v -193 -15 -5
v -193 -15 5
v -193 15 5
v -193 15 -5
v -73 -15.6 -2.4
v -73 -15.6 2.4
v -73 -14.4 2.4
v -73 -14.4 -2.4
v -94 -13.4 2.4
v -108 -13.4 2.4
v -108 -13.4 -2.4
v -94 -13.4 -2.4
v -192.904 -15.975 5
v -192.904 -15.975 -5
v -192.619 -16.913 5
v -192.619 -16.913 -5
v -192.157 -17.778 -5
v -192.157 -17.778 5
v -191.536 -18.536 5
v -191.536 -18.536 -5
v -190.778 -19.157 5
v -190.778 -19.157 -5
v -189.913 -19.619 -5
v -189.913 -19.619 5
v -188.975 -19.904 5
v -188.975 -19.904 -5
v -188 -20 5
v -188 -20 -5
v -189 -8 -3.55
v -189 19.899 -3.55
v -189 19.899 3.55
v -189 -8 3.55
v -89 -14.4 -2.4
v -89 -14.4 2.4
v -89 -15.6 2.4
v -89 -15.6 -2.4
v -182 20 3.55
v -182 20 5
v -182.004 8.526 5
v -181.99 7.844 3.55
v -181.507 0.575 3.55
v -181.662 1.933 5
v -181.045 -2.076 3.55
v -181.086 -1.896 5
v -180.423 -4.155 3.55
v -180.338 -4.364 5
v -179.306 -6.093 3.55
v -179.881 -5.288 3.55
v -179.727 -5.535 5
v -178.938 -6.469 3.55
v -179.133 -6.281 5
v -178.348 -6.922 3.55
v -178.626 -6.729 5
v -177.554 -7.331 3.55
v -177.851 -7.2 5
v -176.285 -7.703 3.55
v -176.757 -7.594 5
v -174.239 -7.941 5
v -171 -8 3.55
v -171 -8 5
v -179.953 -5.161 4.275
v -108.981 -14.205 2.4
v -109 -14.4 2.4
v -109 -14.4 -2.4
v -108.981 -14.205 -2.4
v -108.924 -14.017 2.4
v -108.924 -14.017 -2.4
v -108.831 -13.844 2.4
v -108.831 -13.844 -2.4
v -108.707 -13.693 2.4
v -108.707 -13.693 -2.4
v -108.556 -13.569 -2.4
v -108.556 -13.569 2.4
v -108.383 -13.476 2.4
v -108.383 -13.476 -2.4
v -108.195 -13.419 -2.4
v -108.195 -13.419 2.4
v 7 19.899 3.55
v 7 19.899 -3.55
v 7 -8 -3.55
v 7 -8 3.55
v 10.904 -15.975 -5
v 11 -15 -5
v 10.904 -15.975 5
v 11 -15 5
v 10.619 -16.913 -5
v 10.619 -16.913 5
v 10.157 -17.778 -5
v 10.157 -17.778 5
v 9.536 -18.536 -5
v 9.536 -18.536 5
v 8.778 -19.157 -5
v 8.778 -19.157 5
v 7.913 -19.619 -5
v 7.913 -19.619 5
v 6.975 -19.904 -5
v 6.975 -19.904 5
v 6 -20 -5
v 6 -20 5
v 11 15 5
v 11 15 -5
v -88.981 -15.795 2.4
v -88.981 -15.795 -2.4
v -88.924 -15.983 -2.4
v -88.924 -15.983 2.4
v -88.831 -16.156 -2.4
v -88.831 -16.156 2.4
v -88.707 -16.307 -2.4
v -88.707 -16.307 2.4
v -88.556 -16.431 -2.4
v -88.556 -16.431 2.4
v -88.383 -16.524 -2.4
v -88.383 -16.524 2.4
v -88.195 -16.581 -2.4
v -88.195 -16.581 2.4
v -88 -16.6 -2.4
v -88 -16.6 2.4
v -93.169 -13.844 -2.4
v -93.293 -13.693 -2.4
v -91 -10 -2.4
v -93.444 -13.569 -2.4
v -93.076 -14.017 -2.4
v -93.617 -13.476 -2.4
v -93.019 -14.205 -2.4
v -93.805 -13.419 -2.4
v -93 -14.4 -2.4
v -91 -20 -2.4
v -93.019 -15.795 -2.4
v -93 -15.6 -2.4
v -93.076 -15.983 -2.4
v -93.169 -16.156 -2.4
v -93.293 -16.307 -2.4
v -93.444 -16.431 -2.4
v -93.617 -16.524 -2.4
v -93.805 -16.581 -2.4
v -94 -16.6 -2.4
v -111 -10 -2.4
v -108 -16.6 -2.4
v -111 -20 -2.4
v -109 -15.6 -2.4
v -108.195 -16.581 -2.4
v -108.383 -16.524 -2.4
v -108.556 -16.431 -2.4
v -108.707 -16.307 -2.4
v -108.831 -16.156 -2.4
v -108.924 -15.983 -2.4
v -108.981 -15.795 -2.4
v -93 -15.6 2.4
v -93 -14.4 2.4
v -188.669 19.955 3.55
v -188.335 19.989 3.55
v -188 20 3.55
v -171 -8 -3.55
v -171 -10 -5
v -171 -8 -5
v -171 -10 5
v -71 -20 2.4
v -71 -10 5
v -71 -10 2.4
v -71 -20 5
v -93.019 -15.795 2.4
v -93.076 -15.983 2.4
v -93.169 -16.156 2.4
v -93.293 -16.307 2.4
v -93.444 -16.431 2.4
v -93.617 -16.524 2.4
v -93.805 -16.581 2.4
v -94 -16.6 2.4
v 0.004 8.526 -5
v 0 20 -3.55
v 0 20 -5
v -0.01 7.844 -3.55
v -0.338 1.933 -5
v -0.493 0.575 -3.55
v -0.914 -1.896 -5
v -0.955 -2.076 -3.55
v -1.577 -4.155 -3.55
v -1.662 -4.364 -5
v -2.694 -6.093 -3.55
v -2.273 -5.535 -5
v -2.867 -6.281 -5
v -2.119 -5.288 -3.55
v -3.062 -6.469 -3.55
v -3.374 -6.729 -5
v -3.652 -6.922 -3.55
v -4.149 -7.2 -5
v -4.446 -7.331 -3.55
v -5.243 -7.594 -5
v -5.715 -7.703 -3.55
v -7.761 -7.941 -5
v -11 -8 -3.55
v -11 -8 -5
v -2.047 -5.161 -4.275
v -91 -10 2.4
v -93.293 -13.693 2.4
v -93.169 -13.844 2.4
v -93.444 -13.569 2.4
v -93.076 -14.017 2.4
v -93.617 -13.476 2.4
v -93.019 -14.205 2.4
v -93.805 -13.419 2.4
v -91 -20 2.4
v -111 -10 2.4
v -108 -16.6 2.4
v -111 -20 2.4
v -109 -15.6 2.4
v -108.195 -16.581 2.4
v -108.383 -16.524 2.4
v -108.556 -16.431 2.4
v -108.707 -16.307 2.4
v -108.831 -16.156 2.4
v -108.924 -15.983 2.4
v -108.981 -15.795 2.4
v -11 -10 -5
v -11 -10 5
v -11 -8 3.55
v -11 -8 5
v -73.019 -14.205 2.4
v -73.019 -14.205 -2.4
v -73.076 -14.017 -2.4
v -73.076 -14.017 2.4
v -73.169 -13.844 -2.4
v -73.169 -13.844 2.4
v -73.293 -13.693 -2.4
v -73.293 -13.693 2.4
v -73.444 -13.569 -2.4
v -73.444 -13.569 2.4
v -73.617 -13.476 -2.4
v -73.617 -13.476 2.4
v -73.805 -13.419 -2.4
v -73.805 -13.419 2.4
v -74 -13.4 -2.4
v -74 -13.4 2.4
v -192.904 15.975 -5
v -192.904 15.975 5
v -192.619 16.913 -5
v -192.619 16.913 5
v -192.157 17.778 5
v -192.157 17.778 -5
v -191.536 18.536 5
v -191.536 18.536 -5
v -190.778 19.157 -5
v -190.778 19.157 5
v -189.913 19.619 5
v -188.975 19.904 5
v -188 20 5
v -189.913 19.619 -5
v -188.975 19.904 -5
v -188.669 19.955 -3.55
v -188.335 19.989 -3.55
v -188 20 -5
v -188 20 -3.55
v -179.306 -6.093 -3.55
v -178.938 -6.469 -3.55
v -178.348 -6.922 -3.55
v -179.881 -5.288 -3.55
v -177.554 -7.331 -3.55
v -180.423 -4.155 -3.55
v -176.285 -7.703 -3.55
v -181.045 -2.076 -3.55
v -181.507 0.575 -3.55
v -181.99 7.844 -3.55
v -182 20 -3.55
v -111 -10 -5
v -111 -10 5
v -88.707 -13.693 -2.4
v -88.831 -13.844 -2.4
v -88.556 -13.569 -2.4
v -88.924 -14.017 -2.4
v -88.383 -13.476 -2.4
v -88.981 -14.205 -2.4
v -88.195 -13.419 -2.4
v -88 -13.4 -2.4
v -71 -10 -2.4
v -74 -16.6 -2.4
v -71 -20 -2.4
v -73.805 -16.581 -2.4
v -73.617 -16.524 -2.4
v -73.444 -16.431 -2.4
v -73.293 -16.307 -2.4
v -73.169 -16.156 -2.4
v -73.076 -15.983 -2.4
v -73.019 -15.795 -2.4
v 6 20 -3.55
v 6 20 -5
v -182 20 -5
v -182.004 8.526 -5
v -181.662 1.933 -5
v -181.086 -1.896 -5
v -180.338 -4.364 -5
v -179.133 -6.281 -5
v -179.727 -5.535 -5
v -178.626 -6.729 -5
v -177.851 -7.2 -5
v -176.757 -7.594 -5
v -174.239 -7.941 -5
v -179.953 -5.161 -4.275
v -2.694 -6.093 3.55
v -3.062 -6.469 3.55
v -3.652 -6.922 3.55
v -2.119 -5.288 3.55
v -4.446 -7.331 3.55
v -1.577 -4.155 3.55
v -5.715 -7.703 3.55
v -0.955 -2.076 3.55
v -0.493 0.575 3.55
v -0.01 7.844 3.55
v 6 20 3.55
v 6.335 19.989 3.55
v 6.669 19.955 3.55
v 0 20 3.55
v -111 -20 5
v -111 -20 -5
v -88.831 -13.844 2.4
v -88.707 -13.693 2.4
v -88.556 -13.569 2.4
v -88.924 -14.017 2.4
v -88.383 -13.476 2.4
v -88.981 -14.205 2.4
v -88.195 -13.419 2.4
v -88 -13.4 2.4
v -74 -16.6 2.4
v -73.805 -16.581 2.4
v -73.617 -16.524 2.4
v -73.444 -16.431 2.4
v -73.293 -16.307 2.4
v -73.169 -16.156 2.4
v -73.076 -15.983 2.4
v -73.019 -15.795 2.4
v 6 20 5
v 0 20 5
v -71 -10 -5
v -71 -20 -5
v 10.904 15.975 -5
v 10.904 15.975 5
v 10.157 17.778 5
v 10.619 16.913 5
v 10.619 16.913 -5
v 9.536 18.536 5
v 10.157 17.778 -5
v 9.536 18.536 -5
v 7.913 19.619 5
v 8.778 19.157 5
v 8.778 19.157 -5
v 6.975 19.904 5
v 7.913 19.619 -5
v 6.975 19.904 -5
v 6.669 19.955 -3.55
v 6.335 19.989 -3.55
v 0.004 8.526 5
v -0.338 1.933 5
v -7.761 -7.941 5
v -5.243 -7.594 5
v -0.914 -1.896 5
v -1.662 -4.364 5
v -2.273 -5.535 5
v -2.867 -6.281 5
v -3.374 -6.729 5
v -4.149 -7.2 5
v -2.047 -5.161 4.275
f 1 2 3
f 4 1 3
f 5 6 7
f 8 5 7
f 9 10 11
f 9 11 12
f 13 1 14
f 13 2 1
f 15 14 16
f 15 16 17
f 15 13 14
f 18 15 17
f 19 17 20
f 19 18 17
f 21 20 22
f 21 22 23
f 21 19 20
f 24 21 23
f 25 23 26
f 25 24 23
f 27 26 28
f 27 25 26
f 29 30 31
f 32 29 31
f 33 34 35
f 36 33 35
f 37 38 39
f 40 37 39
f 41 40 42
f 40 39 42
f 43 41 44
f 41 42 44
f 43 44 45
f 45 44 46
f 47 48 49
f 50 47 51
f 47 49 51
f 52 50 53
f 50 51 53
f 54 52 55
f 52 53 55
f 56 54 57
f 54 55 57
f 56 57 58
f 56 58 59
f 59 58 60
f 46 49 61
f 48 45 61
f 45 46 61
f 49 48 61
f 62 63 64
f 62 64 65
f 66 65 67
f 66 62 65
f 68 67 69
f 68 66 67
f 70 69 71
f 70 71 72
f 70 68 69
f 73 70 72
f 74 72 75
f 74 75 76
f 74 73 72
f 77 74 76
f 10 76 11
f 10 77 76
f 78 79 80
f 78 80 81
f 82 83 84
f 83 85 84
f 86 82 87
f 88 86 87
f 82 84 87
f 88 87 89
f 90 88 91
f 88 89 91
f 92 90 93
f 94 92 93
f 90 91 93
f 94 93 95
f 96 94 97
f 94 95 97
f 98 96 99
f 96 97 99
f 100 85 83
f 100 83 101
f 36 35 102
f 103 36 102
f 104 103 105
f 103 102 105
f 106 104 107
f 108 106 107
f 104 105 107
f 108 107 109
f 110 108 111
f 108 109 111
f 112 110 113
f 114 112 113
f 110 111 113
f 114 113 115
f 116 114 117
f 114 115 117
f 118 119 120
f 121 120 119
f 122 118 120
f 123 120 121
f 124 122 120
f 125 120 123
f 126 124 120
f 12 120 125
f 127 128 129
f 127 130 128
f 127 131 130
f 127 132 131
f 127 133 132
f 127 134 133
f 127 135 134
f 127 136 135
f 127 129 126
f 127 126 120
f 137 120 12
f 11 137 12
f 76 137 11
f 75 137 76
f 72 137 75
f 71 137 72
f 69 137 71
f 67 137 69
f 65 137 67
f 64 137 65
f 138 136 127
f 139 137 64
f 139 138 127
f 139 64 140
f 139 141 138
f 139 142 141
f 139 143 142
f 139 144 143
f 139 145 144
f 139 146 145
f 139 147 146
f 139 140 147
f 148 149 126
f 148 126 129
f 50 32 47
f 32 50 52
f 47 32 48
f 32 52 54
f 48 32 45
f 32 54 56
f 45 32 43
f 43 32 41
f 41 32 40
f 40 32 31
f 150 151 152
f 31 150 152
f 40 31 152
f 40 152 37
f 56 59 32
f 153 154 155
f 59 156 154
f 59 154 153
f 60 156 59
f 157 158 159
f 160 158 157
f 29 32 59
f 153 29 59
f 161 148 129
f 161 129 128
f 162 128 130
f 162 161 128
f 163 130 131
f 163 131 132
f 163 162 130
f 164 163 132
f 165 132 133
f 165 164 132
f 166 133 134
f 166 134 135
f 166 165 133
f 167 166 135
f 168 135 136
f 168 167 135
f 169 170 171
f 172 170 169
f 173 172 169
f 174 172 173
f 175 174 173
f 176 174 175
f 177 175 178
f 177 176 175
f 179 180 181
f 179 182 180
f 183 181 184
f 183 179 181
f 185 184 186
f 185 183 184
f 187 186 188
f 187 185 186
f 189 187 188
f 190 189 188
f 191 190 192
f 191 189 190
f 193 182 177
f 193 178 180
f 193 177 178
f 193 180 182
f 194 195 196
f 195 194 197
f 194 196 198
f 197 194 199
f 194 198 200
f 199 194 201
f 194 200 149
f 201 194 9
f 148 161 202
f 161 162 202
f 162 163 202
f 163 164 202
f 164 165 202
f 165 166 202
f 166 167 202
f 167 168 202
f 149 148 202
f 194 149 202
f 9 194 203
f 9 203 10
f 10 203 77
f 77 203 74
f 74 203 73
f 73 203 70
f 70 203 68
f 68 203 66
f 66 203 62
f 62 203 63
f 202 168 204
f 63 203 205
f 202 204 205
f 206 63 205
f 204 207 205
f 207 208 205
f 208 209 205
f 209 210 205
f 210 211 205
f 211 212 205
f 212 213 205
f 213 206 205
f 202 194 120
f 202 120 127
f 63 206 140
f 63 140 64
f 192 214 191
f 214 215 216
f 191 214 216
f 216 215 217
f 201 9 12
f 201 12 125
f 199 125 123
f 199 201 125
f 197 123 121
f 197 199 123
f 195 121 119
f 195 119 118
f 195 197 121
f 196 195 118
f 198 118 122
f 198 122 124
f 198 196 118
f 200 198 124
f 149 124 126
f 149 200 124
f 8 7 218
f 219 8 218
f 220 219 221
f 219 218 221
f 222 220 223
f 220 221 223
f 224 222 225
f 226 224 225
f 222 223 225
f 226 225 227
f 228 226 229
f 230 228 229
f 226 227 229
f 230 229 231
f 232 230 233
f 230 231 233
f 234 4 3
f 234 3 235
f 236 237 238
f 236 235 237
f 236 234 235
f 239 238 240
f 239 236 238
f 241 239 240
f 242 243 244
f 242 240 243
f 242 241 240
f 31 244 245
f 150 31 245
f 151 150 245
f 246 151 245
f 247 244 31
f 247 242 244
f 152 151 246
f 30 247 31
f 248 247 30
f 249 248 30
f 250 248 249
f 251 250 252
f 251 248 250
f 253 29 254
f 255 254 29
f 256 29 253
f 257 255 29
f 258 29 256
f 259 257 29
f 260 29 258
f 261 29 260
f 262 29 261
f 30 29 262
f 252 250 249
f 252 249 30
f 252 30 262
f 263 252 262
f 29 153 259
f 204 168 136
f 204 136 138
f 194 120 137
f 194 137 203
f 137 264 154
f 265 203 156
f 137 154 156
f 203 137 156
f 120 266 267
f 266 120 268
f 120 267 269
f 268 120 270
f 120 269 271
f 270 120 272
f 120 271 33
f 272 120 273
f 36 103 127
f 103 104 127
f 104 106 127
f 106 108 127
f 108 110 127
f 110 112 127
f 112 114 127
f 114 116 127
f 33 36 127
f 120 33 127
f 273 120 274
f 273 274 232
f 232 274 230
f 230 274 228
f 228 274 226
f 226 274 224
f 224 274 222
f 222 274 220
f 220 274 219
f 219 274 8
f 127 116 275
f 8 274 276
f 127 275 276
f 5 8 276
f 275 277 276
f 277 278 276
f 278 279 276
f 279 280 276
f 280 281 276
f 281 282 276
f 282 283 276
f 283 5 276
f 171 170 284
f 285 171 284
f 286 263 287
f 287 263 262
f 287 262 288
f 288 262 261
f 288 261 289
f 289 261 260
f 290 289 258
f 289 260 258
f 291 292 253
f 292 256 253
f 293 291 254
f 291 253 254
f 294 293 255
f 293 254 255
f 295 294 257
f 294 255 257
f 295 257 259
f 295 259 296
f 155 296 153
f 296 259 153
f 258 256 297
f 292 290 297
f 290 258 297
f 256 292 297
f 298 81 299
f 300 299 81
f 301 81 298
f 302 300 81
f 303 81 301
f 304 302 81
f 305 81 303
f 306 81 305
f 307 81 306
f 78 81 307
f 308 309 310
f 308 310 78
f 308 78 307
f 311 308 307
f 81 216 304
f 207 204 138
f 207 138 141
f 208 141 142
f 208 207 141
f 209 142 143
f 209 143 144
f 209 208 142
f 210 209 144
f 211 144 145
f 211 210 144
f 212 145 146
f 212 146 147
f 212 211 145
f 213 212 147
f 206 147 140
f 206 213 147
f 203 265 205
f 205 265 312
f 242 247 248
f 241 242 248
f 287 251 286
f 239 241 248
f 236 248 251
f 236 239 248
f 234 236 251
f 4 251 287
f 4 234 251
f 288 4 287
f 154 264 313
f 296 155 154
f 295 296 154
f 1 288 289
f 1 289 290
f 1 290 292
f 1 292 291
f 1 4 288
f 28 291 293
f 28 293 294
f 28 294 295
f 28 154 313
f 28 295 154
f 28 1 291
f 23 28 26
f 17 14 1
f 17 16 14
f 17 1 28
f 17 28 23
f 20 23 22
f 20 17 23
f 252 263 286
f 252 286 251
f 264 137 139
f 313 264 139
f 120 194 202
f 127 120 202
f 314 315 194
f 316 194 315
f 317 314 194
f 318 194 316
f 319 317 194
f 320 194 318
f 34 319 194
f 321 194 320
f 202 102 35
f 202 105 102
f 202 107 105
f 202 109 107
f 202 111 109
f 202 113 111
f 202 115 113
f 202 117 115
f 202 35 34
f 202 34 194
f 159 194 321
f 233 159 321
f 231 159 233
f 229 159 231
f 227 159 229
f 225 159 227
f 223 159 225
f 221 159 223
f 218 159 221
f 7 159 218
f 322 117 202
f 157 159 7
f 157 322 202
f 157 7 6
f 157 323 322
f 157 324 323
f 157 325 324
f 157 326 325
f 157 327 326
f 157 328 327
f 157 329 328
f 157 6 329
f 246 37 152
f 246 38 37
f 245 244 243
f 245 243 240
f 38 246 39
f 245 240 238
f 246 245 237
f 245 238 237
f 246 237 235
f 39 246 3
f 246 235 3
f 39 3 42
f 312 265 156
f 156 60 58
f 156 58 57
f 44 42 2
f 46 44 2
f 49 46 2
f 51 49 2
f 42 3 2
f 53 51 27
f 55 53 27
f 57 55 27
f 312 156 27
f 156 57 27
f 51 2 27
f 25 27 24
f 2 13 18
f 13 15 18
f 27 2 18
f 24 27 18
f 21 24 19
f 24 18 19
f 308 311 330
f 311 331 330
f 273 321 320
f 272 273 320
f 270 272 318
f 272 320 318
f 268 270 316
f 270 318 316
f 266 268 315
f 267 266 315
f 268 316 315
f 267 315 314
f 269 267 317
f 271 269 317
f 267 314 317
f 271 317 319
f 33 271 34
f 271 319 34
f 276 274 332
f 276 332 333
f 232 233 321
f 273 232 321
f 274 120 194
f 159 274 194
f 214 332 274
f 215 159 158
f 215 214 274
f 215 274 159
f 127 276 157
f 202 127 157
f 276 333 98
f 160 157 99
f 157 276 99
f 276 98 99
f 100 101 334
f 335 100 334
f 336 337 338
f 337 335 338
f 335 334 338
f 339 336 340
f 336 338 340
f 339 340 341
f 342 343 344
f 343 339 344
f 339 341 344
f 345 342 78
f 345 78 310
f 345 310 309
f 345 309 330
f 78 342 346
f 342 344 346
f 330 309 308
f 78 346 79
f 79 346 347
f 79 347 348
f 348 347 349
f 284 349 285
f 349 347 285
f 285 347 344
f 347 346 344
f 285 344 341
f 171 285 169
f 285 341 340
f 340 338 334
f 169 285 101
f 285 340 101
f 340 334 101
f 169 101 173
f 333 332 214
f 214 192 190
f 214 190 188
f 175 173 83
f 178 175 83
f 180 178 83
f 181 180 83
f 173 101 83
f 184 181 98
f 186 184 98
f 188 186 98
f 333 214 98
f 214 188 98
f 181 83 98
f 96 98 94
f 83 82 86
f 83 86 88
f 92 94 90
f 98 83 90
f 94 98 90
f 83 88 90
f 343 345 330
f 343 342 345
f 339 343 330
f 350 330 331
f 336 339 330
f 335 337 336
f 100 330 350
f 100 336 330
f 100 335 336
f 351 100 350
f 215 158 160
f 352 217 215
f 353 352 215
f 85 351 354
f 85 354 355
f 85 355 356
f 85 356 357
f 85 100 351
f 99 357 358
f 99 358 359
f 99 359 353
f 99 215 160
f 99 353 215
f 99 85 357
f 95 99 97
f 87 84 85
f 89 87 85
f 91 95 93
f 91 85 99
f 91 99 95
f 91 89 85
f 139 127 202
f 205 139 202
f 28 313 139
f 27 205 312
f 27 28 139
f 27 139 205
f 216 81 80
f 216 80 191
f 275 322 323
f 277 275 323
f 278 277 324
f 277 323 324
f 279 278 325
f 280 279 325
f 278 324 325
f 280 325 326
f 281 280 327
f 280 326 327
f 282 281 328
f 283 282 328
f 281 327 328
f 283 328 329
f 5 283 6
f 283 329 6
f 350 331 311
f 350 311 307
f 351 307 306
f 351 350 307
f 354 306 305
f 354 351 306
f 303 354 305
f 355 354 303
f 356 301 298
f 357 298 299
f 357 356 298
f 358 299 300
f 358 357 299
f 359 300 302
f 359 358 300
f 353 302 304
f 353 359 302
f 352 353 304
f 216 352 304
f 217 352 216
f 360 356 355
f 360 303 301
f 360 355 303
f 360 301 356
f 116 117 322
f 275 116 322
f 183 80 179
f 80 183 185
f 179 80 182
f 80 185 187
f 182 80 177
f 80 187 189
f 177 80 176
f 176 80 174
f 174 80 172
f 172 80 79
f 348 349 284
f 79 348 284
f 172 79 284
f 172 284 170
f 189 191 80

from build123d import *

# Parameters (mm, degrees)
F0_W         = 22
F0_H         = 40
F1_DEPTH     = 5
F2_W         = 18
F2_H         = 7.1
F3_DEPTH     = 28
F4_W         = 10
F4_H         = 10
F5_DEPTH     = 60
F6_W         = 10
F6_H         = 4.8
F7_DEPTH     = 20
F9_DEPTH     = 4.8
F11_DEPTH    = 10
F12_R        = 5
F13_T1_DEPTH = 35


# Not quite as in the source:
# - a fillet or chamfer that OpenCascade refuses, or shapes differently, is made with other operations: its cross-section is extruded or revolved along the edge and cut away or added


with BuildPart() as f1:
    # F0 (on Top) → F1 (new body, symmetric)
    with BuildSketch(Plane.XY):
        Rectangle(F0_W, F0_H)
    extrude(amount=F1_DEPTH, both=True)

    # F2 (on face) → F3 (cut)
    with BuildSketch(Plane(origin=(0, 20, 0), x_dir=(-1, 0, 0), z_dir=(0, 1, 0))):
        with Locations((2, 0)):
            Rectangle(F2_W, F2_H)
    extrude(amount=-F3_DEPTH, mode=Mode.SUBTRACT)

    # F4 (on face) → F5 (join)
    with BuildSketch(Plane(origin=(-11, 0, 0), x_dir=(0, -1, 0), z_dir=(-1, 0, 0))):
        with Locations((15, 0)):
            Rectangle(F4_W, F4_H)
    extrude(amount=F5_DEPTH)

    # F6 (on face) → F7 (join)
    with BuildSketch(Plane(origin=(-71, 0, 0), x_dir=(0, -1, 0), z_dir=(-1, 0, 0))):
        with Locations((15, 0)):
            Rectangle(F6_W, F6_H)
    extrude(amount=F7_DEPTH)

    # F8 (on face) → F9 (cut, through all)
    with BuildSketch(Plane.XY.offset(2.4)):
        with BuildLine():
            Line((-74, -13.4), (-88, -13.4))
            ThreePointArc((-88, -13.4), (-88.7071067812, -13.6928932188), (-89, -14.4))
            Line((-89, -14.4), (-89, -15.6))
            ThreePointArc((-89, -15.6), (-88.7071067812, -16.3071067812), (-88, -16.6))
            Line((-88, -16.6), (-74, -16.6))
            ThreePointArc((-74, -16.6), (-73.2928932188, -16.3071067812), (-73, -15.6))
            Line((-73, -15.6), (-73, -14.4))
            ThreePointArc((-73, -14.4), (-73.2928932188, -13.6928932188), (-74, -13.4))
        make_face()
    extrude(amount=-F9_DEPTH, mode=Mode.SUBTRACT)

    # F10 (on face) → F11 (cut, through all)
    with BuildSketch(Plane.XY.offset(5)):
        with BuildLine():
            add(Edge.make_bspline(
                [(0, 20), (0, 11.0162314684), (0.75924226, -7.767469097), (-6.2310384733, -8), (-11, -8)],
                knots=[0, 0, 0, 0, 0.6211235912, 1, 1, 1, 1], degree=3))
            Line((0, 20), (-11, 20))
            Line((-11, 20), (-11, -8))
        make_face()
    extrude(amount=-F11_DEPTH, mode=Mode.SUBTRACT)

    # F12
    f12_edges = [f1.edges().sort_by_distance(p)[0] for p in [
        (11, -20, 0),
    ]]
    fillet(f12_edges, radius=F12_R)

    # F13: fillet of radius 5 on 1 edges, made by hand

    # F13_s2 → F13_t1 (cut)
    with BuildSketch(Plane.XY.offset(-17.5)):
        with BuildLine():
            ThreePointArc((11, 15), (9.5355339059, 18.5355339059), (6, 20))
            Line((6, 20), (11, 20))
            Line((11, 20), (11, 15))
        make_face()
    extrude(amount=F13_T1_DEPTH, mode=Mode.SUBTRACT)


with BuildPart() as f14_1:
    # F14: instance of F1
    add(f1.part.mirror(Plane(origin=(-91, -15, 0), x_dir=(0, -1, 0), z_dir=(-1, 0, 0))))


solid = Compound([f1.part, f14_1.part])
